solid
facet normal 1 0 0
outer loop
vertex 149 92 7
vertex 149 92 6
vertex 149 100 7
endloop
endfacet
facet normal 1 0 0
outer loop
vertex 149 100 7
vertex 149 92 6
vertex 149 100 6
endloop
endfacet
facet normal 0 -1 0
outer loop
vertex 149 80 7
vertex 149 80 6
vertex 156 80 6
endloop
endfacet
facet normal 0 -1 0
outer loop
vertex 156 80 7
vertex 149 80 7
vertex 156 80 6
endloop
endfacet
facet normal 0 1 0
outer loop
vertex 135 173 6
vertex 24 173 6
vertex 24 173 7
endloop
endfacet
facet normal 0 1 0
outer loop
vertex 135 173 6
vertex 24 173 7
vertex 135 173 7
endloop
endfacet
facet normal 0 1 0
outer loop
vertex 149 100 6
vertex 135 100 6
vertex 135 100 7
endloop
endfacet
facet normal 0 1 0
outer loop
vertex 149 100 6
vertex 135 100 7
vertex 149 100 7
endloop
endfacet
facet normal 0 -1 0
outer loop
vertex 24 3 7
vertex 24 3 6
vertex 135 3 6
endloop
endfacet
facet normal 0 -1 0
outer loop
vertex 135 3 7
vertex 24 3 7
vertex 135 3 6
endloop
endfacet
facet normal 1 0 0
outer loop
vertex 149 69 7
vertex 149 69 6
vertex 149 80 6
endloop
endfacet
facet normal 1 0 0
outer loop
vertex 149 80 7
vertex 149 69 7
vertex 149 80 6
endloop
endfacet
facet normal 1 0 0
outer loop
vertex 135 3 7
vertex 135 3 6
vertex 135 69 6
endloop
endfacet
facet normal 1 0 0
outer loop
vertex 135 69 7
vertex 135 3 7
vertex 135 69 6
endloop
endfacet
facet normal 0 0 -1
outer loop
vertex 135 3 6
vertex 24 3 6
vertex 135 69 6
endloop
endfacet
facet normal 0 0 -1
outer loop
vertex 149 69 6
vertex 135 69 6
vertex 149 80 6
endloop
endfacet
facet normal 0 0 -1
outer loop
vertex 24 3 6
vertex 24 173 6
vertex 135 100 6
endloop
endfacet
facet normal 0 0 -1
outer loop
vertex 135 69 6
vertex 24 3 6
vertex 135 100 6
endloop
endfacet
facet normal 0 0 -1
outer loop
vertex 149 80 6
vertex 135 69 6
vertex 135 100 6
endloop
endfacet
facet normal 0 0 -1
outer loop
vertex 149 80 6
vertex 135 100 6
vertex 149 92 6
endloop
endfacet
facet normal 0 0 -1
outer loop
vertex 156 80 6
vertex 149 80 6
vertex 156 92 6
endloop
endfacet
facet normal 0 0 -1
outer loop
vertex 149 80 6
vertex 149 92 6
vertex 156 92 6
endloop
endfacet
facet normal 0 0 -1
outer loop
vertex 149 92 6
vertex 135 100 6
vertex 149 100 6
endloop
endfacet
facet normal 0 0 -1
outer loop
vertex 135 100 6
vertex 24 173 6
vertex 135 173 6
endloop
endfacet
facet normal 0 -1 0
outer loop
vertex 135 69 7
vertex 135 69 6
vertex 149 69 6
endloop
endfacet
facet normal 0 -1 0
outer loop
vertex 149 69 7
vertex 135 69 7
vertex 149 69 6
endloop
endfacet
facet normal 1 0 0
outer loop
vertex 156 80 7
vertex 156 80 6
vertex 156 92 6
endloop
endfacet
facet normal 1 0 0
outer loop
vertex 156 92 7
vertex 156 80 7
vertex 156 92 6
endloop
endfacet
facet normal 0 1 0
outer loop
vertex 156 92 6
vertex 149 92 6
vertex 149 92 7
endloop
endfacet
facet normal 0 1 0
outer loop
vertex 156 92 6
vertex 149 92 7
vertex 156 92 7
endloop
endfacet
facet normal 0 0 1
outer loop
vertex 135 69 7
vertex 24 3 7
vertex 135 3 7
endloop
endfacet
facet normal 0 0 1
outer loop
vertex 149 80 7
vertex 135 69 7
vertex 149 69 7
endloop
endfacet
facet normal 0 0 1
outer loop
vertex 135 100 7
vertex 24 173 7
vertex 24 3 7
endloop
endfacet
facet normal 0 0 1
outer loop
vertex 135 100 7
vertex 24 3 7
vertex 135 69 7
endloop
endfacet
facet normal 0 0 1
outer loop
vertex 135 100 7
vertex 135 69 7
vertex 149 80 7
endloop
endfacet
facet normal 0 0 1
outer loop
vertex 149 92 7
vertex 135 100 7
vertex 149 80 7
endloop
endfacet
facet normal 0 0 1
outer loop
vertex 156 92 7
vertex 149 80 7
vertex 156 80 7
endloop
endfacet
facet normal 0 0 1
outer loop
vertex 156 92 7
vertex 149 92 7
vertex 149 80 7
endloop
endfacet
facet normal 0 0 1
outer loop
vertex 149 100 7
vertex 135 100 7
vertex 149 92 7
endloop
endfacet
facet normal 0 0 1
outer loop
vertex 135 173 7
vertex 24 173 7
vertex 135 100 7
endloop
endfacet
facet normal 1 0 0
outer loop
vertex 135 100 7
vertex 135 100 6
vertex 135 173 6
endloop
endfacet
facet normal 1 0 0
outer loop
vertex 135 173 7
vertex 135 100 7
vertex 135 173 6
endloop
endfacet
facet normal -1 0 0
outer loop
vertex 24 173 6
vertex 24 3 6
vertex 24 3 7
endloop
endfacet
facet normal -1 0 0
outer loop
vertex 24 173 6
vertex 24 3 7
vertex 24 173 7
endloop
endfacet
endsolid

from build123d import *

# Parameters (mm, degrees)
BOX014_W     = 111
BOX014_H     = 170
BOX014_DEPTH = 1
BOX015_W     = 14
BOX015_H     = 31
BOX015_DEPTH = 1
BOX016_W     = 7
BOX016_H     = 12
BOX016_DEPTH = 1
BOX017_W     = 97
BOX017_H     = 163
BOX017_DEPTH = 1


with BuildPart() as part:
    # Box014 → Box014 (join)
    with BuildSketch(Plane.XY):
        with Locations((55.5, 85)):
            Rectangle(BOX014_W, BOX014_H)
    extrude(amount=BOX014_DEPTH)

    # Box015 → Box015 (join)
    with BuildSketch(Plane(origin=(111, 66, 0), x_dir=(1, 0, 0), z_dir=(0, 0, 1))):
        with Locations((7, 15.5)):
            Rectangle(BOX015_W, BOX015_H)
    extrude(amount=BOX015_DEPTH)

    # Box016 → Box016 (join)
    with BuildSketch(Plane(origin=(125, 77, 0), x_dir=(1, 0, 0), z_dir=(0, 0, 1))):
        with Locations((3.5, 6)):
            Rectangle(BOX016_W, BOX016_H)
    extrude(amount=BOX016_DEPTH)

    # Box017 → Box017 (join)
    with BuildSketch(Plane(origin=(3, 3, 0), x_dir=(1, 0, 0), z_dir=(0, 0, 1))):
        with Locations((48.5, 81.5)):
            Rectangle(BOX017_W, BOX017_H)
    extrude(amount=BOX017_DEPTH)


with BuildPart() as part_1:
    # Body002 placement: moved
    add(part.part.moved(Location((24, 3, 6))))


solid = part_1.part
